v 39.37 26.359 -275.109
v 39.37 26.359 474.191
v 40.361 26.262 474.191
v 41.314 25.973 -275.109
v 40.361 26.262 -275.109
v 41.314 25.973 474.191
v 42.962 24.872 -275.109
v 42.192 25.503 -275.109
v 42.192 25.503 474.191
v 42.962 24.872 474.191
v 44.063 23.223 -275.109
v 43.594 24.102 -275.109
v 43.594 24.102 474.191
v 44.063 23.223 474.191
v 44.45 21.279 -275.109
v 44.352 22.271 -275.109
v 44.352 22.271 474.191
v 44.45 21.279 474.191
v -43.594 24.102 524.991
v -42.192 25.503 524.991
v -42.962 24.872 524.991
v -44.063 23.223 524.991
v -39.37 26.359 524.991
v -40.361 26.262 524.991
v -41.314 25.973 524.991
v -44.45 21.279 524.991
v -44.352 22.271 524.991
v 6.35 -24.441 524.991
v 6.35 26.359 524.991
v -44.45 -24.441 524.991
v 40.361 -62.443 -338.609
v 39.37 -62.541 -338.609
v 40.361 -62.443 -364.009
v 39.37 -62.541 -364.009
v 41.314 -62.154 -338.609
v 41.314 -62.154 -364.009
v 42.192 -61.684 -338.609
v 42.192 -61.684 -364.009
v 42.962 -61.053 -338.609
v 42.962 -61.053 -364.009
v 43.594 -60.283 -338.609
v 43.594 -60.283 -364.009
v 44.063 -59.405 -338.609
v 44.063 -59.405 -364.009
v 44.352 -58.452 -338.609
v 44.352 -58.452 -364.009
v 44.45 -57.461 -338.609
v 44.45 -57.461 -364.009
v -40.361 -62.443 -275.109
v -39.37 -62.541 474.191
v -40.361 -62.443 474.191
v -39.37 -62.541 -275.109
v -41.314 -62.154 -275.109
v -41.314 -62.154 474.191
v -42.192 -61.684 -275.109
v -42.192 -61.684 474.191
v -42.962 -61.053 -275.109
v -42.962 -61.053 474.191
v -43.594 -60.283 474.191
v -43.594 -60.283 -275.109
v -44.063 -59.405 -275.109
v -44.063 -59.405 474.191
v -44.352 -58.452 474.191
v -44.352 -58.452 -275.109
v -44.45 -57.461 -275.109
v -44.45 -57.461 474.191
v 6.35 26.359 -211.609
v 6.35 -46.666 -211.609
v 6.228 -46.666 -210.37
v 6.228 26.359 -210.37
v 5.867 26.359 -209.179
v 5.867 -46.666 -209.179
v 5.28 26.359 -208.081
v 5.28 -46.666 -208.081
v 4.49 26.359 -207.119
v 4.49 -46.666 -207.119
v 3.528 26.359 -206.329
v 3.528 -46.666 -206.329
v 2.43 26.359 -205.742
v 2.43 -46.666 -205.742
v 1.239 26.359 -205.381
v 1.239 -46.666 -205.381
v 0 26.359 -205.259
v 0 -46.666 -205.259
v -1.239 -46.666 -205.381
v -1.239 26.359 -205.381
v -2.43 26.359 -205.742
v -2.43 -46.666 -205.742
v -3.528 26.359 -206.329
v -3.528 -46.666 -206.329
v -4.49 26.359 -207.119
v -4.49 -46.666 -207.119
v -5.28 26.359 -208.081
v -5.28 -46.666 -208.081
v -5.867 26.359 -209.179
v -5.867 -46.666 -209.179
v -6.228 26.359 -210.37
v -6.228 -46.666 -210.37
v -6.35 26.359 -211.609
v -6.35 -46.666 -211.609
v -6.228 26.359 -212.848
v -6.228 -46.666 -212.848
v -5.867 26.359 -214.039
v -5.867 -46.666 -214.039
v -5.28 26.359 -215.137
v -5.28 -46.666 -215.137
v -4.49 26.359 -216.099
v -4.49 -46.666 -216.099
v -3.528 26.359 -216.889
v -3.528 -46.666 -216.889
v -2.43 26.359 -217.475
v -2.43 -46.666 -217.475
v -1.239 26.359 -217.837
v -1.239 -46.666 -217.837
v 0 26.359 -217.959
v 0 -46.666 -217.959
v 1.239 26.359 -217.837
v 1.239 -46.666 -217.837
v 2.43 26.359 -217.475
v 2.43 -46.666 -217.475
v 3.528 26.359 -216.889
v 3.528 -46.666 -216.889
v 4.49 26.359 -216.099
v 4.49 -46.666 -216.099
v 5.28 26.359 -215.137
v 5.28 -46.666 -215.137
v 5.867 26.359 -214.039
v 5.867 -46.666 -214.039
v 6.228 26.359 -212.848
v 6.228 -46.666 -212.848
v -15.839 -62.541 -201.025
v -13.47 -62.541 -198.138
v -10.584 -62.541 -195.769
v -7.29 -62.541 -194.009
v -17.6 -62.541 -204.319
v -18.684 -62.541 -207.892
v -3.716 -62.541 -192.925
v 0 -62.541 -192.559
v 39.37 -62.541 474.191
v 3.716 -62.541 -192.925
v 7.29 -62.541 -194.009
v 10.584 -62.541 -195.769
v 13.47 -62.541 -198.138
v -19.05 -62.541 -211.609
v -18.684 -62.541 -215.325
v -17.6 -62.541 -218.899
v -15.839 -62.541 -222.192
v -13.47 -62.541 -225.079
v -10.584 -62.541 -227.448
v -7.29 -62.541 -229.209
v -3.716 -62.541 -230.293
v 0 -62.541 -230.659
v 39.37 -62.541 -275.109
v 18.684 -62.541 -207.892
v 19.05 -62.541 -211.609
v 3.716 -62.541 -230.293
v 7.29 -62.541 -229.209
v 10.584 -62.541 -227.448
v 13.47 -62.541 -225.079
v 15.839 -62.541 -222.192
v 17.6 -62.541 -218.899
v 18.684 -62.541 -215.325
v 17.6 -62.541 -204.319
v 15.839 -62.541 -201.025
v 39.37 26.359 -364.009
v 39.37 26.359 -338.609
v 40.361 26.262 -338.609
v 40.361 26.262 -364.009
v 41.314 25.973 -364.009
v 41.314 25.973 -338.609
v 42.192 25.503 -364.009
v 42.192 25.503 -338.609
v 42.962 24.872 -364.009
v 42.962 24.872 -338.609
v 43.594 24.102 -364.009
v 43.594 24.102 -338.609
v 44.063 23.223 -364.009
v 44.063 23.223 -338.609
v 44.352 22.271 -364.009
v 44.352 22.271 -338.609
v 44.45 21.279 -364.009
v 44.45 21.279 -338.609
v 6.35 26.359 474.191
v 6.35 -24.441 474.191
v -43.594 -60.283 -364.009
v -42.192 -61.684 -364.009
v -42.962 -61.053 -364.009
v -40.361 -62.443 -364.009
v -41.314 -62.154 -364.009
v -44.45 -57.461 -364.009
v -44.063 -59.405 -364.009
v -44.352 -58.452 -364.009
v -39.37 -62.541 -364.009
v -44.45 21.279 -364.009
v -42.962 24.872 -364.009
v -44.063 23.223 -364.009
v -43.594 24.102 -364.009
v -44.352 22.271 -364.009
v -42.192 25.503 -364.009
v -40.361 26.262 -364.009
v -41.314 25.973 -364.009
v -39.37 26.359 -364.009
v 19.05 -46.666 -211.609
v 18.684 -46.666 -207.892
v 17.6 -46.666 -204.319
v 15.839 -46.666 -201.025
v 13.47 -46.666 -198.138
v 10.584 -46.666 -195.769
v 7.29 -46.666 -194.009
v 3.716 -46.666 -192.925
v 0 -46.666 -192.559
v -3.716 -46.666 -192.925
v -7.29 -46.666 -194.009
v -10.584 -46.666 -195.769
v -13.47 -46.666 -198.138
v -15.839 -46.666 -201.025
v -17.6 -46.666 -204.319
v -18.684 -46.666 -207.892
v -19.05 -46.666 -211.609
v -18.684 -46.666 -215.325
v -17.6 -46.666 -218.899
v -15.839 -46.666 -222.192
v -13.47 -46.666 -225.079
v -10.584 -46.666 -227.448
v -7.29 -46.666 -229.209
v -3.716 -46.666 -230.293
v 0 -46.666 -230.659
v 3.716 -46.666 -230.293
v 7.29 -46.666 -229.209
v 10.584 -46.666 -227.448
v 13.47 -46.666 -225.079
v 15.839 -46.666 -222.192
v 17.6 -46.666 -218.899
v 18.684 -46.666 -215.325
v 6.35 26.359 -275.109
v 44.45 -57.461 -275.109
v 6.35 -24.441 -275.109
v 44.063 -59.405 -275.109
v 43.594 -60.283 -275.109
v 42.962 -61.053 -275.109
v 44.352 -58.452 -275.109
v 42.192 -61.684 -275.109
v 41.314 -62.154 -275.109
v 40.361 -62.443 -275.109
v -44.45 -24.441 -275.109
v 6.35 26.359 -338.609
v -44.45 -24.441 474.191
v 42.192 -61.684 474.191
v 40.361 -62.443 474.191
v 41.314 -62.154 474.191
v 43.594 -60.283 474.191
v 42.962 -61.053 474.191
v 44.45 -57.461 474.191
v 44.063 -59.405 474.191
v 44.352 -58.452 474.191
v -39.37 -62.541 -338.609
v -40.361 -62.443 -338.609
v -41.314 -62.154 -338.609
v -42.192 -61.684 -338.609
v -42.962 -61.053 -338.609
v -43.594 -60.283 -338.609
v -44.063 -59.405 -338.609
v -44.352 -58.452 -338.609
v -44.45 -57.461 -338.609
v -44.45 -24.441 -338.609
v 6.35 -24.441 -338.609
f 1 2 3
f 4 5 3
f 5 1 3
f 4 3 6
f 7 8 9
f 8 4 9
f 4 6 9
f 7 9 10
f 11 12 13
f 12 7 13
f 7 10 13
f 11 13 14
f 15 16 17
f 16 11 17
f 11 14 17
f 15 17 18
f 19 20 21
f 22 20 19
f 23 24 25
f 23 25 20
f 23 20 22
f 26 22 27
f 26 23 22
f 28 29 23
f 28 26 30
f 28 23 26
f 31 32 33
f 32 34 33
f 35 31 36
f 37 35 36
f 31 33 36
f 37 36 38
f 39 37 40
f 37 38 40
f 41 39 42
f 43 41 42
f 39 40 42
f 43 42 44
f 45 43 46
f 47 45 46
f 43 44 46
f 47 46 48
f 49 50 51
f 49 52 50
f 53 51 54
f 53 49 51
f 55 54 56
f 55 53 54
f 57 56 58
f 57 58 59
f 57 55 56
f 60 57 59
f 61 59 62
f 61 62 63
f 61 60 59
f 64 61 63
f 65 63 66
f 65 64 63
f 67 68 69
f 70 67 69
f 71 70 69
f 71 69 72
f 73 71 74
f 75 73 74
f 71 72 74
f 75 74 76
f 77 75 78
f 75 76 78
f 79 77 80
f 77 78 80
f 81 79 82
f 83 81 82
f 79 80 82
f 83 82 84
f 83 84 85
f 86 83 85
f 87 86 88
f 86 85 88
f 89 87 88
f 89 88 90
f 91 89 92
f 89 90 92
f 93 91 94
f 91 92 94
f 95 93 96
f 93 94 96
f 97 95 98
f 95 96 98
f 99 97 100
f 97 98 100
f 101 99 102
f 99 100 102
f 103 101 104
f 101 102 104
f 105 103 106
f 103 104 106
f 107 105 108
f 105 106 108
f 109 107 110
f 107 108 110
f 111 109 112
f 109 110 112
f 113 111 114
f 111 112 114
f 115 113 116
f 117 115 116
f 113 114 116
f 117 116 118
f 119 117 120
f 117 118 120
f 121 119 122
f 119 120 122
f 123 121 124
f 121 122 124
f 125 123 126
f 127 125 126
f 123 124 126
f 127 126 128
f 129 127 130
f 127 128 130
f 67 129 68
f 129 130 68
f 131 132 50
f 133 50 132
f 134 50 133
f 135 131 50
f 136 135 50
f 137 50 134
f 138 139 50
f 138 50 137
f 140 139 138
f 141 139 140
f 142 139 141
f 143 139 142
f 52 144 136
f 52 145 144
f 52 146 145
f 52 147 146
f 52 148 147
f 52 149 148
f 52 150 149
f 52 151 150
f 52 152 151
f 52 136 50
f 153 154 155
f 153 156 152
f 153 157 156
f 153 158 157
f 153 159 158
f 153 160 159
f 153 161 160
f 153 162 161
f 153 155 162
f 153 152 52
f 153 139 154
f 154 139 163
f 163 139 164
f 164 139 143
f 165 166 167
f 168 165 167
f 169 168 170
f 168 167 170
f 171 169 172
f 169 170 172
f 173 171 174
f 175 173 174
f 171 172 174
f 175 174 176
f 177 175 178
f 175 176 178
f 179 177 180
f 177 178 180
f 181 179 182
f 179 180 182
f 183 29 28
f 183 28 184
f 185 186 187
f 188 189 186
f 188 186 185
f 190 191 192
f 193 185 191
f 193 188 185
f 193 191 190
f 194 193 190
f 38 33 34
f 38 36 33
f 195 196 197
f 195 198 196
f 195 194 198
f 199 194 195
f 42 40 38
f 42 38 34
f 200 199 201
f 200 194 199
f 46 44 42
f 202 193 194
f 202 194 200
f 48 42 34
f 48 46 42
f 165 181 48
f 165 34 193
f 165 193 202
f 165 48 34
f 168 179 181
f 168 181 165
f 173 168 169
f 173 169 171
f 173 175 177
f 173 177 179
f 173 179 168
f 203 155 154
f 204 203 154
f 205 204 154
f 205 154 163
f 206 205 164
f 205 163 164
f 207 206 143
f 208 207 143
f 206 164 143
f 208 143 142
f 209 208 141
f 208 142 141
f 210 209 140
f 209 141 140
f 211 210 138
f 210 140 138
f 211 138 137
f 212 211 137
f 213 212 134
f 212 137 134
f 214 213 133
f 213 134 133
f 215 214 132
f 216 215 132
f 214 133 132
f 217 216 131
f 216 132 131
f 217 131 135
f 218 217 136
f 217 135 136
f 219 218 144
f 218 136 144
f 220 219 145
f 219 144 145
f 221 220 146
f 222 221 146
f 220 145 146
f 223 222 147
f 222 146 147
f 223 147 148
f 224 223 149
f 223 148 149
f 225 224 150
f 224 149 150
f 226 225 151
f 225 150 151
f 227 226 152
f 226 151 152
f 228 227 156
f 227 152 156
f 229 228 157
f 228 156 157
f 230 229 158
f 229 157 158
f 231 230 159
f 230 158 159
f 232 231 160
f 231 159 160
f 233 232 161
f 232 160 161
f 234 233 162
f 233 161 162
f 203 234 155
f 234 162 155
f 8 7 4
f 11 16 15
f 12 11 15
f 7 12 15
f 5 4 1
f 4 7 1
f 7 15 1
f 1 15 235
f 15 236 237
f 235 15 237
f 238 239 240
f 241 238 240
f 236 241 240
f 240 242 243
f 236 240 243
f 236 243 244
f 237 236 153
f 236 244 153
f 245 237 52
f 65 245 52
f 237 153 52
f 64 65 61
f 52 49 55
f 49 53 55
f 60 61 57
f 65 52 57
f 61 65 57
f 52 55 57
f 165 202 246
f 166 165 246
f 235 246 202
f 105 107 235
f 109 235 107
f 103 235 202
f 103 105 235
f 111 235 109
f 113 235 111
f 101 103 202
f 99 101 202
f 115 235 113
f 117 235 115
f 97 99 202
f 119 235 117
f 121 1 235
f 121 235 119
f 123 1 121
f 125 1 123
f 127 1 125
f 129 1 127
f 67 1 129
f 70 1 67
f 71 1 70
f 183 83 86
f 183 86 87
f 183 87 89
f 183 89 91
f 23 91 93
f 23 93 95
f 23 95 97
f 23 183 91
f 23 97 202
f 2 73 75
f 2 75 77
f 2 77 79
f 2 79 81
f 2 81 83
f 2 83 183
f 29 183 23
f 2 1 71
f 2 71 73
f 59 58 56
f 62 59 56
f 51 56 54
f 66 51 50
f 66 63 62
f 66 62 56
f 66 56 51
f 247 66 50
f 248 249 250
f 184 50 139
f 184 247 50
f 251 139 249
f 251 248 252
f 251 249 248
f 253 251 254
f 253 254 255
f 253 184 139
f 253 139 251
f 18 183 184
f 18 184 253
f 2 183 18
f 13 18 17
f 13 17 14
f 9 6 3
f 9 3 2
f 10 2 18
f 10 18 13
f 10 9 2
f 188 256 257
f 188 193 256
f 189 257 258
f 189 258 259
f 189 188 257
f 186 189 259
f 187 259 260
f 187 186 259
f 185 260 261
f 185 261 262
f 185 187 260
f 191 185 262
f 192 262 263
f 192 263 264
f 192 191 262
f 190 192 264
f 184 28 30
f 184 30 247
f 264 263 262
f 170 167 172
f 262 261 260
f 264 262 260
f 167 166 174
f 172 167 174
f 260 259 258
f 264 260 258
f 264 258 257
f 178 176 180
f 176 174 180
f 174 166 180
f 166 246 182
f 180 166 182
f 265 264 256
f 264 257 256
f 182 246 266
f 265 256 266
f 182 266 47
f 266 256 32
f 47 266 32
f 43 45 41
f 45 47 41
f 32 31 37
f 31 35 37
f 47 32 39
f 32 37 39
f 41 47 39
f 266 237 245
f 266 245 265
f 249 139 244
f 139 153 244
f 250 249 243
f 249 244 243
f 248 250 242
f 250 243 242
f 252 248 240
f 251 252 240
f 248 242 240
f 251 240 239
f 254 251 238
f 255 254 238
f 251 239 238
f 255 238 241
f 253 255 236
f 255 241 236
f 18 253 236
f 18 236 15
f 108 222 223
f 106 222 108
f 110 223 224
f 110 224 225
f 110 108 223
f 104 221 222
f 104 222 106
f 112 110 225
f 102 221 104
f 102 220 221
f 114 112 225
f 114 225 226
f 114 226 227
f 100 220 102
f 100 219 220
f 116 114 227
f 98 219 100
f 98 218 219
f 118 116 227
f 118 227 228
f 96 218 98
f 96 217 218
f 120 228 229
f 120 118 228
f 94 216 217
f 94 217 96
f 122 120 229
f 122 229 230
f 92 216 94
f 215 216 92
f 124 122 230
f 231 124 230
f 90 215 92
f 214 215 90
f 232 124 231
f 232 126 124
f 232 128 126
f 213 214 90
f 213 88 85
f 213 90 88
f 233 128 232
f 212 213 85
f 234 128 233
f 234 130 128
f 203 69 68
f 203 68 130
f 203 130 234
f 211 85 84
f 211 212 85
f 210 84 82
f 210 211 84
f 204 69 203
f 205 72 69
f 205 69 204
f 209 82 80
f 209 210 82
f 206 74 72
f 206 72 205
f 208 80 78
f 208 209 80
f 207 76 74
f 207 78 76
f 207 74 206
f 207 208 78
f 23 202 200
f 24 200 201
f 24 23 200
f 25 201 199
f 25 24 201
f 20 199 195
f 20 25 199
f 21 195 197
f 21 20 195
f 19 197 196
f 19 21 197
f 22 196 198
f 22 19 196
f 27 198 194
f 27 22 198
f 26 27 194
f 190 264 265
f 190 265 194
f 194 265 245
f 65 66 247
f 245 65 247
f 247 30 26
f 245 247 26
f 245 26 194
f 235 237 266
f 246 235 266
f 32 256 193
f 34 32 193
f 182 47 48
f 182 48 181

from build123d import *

# Parameters (mm, degrees)
F1_DEPTH      = 44.45
F2_R          = 5.08
F4_DEPTH      = 50.8
F5_R          = 6.35
F6_DEPTH      = 26.360464475
F6_DEPTH_BACK = 62.541535525
F7_R          = 19.05
F7_R_2        = 6.35
F8_DEPTH      = 15.875


with BuildPart() as f1:
    # F0 (on Right) → F1 (new body, symmetric)
    with BuildSketch(Plane.YZ):
        Polygon((26.359464475, -364.0086964671), (26.359464475, 524.9913035329), (-24.440535525, 524.9913035329), (-24.440535525, 474.1913035329), (-62.540535525, 474.1913035329), (-62.540535525, -275.1086964671), (-24.440535525, -275.1086964671), (-24.440535525, -338.6086964671), (-62.540535525, -338.6086964671), (-62.540535525, -364.0086964671), align=None)
    extrude(amount=F1_DEPTH, both=True)

    # F2
    f2_edges = [f1.edges().sort_by_distance(p)[0] for p in [
        (44.45, -62.540536, 99.541304),
        (44.45, -62.540536, -351.308696),
        (-44.45, -62.540536, -351.308696),
        (-44.45, -62.540536, 99.541304),
        (44.45, 26.359464, 80.491304),
        (-44.45, 26.359464, 80.491304),
    ]]
    fillet(f2_edges, radius=F2_R)

    # F3 (on Front) → F4 (cut, symmetric)
    with BuildSketch(Plane.XZ):
        Polygon((44.45, 474.1913035329), (44.45, 524.9913035329), (6.35, 524.9913035329), (6.35, 474.1913035329), (39.37, 474.1913035329), align=None)
        Polygon((44.45, -275.1086964671), (39.37, -275.1086964671), (6.35, -275.1086964671), (6.35, -338.6086964671), (39.37, -338.6086964671), (44.45, -338.6086964671), align=None)
    extrude(amount=F4_DEPTH, both=True, mode=Mode.SUBTRACT)

    # F5 (on Front) → F6 (cut, two sides)
    with BuildSketch(Plane.XZ) as f6_sk:
        with Locations((0, -211.6086964671)):
            Circle(F5_R)
    extrude(amount=-F6_DEPTH, mode=Mode.SUBTRACT)
    extrude(f6_sk.sketch, amount=F6_DEPTH_BACK, mode=Mode.SUBTRACT)

    # F7 (on face) → F8 (cut)
    with BuildSketch(Plane.XZ.offset(62.540535525)):
        with Locations((0, -211.6086964671)):
            Circle(F7_R)
        with Locations((0, -211.6086964671)):
            Circle(F7_R_2, mode=Mode.SUBTRACT)
    extrude(amount=-F8_DEPTH, mode=Mode.SUBTRACT)


solid = f1.part
